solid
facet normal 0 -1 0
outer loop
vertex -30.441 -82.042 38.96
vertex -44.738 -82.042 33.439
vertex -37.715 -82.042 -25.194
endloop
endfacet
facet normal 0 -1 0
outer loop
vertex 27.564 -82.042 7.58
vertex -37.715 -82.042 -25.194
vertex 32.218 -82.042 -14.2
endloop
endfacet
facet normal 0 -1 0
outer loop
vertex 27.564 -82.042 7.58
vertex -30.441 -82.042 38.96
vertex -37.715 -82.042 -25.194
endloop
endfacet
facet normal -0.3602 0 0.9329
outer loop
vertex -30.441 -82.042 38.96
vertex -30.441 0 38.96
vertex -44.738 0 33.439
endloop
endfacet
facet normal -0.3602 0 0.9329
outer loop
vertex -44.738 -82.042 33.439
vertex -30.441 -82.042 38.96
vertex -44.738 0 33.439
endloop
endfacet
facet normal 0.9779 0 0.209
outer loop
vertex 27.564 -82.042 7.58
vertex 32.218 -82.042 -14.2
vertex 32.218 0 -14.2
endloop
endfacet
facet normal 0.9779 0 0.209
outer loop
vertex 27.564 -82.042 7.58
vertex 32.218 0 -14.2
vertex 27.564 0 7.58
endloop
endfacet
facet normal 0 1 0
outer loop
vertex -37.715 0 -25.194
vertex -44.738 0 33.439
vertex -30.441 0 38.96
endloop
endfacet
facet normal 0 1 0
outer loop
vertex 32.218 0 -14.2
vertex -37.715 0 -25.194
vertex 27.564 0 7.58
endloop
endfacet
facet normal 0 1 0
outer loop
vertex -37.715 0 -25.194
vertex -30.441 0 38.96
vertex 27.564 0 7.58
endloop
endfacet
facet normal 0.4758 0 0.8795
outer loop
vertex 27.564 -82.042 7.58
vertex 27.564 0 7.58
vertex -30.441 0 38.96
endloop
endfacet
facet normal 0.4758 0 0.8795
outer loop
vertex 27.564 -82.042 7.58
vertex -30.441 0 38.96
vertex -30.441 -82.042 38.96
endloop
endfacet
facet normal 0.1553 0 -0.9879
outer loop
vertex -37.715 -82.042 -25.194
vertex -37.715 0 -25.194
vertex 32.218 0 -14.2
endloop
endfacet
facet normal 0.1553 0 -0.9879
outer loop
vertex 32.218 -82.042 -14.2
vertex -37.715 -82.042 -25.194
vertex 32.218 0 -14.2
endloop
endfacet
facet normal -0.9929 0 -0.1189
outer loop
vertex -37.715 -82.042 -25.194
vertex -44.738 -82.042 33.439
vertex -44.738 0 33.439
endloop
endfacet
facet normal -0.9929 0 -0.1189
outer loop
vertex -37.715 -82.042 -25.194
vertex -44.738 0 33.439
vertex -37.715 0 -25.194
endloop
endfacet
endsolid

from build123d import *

# Parameters (mm, degrees)
F1_DEPTH = 82.042
F2_SIZE  = 50.8


with BuildPart() as f1:
    # F0 (on Front) → F1 (new body)
    with BuildSketch(Plane.XZ):
        Polygon((16.948685, 57.259064), (-44.738416, 33.439294), (-37.714638, -25.193989), (32.217763, -14.200249), align=None)
    extrude(amount=F1_DEPTH)

    # F2
    f2_edges = [f1.edges().sort_by_distance(p)[0] for p in [
        (16.948685, -41.021, 57.259064),
    ]]
    chamfer(f2_edges, length=F2_SIZE)


solid = f1.part
